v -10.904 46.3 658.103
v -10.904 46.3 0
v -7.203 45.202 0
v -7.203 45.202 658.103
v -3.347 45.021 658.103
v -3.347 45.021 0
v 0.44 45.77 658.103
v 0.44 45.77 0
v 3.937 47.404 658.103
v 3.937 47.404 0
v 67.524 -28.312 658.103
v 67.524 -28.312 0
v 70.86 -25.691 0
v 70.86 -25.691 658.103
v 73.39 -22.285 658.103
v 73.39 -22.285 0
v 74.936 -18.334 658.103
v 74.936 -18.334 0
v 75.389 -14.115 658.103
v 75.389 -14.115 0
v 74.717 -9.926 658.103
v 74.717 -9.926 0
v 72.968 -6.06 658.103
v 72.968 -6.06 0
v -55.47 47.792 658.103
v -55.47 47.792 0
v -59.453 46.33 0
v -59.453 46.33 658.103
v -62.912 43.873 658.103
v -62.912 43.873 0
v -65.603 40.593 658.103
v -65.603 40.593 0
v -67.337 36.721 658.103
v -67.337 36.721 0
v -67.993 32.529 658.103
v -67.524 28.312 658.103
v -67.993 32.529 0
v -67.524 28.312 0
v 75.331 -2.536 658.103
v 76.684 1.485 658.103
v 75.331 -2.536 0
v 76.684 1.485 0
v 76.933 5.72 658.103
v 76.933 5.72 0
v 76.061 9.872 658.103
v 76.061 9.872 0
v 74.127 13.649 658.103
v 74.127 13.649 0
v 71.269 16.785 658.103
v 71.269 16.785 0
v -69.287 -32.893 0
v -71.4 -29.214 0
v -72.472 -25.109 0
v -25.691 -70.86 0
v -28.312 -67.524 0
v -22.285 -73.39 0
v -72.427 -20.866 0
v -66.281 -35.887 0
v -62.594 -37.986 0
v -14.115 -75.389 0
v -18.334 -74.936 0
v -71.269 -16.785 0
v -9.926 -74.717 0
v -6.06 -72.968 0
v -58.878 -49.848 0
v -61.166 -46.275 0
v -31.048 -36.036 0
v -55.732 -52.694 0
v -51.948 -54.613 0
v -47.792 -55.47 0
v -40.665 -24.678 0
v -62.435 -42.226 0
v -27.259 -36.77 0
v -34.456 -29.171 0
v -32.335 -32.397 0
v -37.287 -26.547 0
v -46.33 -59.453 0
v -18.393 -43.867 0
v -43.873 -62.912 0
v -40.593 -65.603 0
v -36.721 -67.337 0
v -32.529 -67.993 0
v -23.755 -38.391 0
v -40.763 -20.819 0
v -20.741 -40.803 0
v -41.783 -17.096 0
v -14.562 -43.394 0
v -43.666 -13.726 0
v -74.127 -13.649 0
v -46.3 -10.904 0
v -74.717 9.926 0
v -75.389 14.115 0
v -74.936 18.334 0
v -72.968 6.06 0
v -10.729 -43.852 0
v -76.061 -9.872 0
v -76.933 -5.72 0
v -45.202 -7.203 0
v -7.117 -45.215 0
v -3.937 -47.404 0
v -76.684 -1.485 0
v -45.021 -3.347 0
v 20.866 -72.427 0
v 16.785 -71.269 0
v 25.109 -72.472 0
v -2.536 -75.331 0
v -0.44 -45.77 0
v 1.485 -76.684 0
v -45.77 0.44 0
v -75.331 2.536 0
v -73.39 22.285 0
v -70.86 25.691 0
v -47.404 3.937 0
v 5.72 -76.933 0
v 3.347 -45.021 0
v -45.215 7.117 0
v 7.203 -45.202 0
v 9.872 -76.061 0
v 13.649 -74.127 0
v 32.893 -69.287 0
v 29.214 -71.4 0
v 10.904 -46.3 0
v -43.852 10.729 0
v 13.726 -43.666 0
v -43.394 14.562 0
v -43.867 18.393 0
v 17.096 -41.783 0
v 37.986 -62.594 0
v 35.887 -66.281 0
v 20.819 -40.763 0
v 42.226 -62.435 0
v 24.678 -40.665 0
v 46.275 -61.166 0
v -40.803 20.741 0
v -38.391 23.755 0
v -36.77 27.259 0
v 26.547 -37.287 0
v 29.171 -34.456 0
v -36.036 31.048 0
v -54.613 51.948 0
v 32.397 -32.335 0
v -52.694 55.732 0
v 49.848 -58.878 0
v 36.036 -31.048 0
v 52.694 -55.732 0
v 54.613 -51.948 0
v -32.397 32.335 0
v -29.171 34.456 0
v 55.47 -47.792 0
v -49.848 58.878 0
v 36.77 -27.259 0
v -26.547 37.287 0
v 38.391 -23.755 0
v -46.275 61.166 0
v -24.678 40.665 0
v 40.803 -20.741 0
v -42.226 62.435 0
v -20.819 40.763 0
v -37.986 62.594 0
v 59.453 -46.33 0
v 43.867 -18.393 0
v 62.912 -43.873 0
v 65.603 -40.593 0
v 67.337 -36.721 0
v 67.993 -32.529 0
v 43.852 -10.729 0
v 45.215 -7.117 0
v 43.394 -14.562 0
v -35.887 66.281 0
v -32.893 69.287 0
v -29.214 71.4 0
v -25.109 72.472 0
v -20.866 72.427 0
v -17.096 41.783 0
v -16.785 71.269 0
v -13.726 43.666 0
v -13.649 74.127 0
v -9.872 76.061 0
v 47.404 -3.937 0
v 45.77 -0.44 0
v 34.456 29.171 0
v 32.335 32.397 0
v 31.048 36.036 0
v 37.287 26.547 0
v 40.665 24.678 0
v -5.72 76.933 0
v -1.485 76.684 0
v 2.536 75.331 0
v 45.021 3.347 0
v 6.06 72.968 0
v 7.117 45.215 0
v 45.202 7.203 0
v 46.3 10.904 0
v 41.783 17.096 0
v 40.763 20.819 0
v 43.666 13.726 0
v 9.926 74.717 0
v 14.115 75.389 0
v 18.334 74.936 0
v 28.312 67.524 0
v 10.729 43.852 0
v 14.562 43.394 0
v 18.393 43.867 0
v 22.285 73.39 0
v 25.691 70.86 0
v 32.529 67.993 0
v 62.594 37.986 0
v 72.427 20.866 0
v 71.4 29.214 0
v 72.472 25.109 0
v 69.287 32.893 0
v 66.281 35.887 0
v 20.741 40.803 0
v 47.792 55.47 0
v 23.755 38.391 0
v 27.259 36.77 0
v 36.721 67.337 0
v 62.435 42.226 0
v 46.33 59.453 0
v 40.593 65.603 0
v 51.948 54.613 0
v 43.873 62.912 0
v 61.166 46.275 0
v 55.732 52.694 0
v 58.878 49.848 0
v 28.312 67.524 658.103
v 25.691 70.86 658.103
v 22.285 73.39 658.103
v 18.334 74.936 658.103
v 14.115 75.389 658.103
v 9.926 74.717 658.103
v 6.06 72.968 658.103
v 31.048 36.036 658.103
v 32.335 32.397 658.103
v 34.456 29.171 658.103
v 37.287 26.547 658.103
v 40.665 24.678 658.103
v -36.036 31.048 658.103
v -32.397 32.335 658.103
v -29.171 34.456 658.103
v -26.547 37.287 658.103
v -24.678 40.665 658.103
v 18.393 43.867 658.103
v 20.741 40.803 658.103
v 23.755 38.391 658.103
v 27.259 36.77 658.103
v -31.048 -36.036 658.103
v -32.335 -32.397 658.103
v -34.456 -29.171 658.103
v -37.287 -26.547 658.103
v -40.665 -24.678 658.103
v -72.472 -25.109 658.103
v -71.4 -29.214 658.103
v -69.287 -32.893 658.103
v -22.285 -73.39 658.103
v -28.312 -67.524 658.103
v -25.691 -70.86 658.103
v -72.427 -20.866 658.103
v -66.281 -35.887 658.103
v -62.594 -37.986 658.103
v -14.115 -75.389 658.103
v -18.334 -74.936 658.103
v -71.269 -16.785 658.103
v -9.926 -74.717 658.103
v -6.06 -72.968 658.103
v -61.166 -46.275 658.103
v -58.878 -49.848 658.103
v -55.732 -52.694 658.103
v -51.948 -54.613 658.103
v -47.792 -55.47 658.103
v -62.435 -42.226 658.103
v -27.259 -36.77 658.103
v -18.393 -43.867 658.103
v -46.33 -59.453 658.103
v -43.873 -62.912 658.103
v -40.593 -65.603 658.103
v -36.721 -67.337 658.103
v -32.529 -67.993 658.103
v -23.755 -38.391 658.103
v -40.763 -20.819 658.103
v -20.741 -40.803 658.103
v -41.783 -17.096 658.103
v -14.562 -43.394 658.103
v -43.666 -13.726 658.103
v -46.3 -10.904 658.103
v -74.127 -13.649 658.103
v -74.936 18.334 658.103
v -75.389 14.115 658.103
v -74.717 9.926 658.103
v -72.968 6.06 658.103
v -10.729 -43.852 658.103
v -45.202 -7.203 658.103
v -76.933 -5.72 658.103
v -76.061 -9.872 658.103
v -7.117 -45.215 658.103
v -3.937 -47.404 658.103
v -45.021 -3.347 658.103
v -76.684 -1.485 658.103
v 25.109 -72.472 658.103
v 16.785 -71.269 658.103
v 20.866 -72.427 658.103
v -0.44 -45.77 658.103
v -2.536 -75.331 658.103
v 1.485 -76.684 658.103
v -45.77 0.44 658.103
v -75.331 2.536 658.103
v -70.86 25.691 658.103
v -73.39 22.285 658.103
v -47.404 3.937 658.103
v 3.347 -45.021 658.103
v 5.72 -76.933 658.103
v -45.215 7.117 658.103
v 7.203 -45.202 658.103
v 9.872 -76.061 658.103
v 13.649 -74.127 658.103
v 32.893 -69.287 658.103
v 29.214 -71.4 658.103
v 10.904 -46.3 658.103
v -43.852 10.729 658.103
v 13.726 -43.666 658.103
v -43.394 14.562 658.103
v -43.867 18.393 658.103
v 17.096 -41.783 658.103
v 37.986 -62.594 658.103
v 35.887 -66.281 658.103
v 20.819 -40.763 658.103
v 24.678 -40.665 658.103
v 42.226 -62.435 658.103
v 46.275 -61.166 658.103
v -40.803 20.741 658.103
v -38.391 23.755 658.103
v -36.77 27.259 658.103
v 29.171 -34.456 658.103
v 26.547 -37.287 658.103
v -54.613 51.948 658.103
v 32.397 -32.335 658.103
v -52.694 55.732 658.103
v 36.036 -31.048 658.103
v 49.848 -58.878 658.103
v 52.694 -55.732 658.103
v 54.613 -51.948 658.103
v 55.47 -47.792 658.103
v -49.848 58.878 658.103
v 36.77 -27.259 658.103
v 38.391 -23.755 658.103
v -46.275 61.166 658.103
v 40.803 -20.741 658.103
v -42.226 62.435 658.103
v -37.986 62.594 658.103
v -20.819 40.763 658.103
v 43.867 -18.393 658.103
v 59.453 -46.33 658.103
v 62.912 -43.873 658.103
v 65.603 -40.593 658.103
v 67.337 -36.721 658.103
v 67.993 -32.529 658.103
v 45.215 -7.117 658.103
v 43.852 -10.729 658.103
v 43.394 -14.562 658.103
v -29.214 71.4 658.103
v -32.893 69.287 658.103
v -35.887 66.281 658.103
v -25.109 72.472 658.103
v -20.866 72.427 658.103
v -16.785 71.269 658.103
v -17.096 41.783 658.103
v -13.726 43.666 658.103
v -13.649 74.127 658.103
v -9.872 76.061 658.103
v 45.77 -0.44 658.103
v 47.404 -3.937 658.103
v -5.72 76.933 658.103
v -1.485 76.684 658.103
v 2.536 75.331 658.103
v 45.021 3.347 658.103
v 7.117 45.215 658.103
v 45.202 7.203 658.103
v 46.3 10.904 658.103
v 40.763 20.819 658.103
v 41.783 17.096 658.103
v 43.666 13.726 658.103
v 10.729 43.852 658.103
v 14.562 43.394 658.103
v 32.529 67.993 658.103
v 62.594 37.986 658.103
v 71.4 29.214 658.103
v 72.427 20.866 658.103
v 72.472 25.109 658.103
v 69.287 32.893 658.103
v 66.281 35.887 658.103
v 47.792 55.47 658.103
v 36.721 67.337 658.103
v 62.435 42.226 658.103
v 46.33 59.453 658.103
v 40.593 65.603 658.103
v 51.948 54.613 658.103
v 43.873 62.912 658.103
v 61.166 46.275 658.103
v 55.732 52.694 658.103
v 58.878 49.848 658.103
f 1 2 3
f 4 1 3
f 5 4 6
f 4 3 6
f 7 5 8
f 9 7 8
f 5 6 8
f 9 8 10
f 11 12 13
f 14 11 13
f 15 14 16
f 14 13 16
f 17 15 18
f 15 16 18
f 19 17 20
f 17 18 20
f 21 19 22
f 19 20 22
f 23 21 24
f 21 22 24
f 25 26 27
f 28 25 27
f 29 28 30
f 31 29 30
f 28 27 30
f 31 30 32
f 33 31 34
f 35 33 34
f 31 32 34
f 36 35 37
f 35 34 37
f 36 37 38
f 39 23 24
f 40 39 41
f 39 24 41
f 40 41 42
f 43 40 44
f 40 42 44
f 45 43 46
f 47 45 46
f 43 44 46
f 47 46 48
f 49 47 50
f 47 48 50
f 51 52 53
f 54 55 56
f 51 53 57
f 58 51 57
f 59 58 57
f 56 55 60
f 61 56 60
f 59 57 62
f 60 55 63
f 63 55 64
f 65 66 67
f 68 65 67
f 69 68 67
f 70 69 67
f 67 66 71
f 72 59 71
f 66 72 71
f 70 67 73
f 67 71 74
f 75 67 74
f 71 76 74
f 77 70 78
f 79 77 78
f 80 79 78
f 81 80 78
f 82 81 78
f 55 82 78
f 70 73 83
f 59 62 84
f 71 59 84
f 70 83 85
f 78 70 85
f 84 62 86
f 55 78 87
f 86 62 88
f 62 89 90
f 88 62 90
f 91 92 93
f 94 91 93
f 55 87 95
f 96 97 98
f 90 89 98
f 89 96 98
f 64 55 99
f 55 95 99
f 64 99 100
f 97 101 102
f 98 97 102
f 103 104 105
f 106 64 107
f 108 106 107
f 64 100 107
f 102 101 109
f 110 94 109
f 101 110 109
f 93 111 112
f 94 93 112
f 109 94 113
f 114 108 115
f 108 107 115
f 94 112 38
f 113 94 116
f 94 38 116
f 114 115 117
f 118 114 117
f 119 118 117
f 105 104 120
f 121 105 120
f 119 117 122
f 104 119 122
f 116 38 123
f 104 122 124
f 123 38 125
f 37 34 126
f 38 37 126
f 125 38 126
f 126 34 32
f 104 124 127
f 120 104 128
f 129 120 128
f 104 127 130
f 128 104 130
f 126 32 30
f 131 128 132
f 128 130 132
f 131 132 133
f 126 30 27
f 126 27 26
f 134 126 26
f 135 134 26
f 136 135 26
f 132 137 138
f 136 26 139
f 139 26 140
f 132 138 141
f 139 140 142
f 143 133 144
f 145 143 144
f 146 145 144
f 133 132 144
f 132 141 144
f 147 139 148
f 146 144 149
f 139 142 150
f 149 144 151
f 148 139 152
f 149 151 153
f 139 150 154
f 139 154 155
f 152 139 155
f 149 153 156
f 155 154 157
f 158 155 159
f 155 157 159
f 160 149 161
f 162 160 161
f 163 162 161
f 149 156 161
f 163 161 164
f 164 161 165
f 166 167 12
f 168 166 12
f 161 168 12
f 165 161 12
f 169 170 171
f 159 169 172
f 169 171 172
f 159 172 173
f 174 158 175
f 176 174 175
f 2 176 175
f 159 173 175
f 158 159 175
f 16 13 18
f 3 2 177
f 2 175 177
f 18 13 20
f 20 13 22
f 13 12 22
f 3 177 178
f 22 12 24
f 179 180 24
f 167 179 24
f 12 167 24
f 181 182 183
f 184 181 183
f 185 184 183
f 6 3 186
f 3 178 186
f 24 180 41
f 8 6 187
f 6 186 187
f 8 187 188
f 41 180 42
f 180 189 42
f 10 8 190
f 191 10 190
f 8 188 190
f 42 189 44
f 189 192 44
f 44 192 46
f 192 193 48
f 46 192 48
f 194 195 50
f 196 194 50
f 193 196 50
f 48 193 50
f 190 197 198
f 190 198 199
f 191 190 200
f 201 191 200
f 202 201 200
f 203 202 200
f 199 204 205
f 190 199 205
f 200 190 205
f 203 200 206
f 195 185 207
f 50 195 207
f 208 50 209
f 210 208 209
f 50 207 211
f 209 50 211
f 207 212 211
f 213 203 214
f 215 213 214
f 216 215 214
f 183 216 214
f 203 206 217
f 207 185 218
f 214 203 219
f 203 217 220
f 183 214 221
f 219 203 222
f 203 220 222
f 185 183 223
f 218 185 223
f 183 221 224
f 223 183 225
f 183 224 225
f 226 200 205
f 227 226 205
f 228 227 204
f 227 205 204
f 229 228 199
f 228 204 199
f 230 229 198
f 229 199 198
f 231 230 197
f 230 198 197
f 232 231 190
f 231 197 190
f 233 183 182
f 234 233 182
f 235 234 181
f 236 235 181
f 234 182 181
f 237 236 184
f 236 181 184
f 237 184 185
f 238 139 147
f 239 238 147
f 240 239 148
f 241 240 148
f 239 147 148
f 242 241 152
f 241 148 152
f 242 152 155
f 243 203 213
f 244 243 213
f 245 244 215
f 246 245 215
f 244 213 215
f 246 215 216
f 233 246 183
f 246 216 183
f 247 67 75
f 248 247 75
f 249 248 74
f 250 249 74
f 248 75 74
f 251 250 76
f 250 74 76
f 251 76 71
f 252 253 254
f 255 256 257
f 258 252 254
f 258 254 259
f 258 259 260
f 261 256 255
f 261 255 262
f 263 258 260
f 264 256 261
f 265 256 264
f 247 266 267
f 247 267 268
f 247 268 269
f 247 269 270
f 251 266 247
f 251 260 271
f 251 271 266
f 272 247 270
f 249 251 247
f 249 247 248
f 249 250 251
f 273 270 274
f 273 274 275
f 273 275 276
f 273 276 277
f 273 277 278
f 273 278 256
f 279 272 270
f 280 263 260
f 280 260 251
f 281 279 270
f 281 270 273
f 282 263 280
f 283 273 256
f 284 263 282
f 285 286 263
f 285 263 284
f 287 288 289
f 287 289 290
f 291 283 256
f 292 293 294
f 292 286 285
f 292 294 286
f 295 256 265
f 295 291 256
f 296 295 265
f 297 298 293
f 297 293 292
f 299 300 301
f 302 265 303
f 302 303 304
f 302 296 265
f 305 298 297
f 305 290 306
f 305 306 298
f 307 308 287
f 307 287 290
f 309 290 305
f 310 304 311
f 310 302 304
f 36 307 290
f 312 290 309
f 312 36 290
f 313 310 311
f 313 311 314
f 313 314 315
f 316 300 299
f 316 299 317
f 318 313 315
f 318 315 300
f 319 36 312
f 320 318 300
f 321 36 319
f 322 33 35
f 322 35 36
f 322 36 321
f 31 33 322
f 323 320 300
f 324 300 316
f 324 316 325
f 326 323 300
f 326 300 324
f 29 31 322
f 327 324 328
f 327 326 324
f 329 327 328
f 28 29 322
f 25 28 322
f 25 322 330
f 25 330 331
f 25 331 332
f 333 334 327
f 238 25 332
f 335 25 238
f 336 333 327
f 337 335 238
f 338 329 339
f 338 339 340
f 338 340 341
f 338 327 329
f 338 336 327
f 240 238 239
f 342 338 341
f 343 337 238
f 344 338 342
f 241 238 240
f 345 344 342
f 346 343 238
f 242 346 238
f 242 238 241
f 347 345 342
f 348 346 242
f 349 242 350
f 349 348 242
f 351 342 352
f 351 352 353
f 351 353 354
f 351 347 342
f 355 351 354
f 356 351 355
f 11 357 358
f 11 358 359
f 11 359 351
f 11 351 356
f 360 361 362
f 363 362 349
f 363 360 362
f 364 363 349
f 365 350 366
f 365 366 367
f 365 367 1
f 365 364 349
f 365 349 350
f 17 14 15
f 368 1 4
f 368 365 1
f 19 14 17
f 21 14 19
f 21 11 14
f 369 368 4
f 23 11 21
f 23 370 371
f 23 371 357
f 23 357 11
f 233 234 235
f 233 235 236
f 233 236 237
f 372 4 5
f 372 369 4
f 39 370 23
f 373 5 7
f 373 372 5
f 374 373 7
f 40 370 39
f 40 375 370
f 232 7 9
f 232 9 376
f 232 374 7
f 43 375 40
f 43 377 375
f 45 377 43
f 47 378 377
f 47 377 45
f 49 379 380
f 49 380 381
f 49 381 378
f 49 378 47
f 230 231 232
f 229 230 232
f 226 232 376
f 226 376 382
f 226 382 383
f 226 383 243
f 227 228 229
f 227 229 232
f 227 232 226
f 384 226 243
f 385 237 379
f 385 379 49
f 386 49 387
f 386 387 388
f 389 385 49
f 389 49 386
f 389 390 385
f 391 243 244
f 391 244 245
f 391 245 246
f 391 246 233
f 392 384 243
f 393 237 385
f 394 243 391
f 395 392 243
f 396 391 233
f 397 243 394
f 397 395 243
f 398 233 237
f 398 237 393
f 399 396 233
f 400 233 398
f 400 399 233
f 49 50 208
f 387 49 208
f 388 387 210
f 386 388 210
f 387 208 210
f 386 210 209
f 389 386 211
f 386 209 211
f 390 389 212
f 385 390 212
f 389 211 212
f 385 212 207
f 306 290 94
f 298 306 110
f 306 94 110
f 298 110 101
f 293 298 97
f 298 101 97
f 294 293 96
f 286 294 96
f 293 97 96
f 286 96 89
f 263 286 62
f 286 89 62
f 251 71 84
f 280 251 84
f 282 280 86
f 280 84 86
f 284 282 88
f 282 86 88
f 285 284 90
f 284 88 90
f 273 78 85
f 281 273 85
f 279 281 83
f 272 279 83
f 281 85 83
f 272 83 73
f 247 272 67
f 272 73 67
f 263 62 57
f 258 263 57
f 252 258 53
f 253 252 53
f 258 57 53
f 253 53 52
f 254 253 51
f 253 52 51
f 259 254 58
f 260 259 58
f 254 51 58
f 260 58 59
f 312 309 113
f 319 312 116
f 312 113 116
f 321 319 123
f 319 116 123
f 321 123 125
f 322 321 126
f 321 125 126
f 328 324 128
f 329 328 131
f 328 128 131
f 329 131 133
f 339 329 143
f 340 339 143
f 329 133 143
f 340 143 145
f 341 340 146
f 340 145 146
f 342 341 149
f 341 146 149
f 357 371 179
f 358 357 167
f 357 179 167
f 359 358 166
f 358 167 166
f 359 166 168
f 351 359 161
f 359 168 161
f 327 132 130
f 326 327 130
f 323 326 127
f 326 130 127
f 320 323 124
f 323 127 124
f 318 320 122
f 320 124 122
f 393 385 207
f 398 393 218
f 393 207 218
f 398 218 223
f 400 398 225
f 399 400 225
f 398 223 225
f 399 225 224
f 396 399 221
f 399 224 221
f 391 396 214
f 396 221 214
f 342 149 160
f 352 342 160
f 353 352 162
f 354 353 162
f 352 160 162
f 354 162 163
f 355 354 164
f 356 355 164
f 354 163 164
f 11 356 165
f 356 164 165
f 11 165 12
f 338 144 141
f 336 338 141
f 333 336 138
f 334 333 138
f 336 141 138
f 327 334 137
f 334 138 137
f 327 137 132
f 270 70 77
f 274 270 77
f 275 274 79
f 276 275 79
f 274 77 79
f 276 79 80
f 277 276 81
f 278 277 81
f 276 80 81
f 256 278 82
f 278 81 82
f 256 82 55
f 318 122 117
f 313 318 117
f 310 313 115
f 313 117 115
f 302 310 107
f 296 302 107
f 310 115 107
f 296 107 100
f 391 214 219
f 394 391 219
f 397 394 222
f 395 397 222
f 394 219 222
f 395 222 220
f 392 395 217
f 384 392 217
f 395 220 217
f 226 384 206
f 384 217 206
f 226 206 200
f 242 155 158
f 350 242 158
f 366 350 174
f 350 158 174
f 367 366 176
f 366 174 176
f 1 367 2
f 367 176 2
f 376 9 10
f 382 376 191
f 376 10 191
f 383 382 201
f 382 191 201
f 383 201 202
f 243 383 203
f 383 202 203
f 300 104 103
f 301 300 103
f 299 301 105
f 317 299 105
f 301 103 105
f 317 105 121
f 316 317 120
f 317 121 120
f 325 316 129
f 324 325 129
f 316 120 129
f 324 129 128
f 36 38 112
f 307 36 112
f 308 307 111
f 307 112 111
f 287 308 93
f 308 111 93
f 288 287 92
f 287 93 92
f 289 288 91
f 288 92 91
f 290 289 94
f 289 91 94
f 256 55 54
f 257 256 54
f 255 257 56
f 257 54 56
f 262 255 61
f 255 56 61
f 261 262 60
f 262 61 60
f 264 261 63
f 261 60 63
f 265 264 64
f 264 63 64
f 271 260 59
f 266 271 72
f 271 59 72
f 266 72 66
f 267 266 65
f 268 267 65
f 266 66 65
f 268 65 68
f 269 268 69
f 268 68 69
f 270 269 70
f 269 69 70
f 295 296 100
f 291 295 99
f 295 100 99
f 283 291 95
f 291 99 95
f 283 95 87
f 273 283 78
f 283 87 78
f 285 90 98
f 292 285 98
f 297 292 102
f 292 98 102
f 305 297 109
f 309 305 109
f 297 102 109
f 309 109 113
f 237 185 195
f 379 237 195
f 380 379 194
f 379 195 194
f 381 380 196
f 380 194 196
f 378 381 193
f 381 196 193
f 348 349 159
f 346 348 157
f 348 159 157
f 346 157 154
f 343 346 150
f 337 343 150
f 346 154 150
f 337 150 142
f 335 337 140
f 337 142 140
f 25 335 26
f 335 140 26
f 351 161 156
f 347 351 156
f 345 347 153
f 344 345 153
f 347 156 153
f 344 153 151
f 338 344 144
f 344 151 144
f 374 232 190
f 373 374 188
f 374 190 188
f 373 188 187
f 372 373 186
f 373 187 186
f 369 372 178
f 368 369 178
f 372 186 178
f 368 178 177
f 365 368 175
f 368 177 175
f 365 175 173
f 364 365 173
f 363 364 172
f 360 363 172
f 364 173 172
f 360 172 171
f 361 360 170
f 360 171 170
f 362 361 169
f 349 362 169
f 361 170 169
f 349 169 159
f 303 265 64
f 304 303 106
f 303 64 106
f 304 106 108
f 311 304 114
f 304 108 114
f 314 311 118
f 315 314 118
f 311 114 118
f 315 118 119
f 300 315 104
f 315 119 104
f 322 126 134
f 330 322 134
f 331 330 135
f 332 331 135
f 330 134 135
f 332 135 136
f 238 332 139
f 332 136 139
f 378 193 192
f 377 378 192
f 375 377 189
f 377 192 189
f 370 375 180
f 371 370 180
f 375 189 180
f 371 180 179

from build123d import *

# Parameters (mm, degrees)
EXTRUDE_1_DEPTH = 658.10320896


with BuildPart() as part:
    # 草图1 → 凸台-拉伸1 (new body)
    with BuildSketch(Plane.XY):
        with BuildLine():
            ThreePointArc((-16.784563495, 71.269141327), (-29.213900725, 71.400407716), (-37.986444329, 62.594265907))
            ThreePointArc((-37.986444329, 62.594265907), (-49.84801004, 58.878231228), (-55.469947326, 47.79222762))
            ThreePointArc((-55.469947326, 47.79222762), (-65.602648822, 40.592643239), (-67.523665397, 28.311953105))
            ThreePointArc((-67.523665397, 28.311953105), (-74.935643256, 18.333564505), (-72.967696633, 6.06030736))
            ThreePointArc((-72.967696633, 6.06030736), (-76.93341482, -5.720131261), (-71.269141327, -16.784563495))
            ThreePointArc((-71.269141327, -16.784563495), (-71.400407716, -29.213900725), (-62.594265907, -37.986444329))
            ThreePointArc((-62.594265907, -37.986444329), (-58.878231228, -49.84801004), (-47.79222762, -55.469947326))
            ThreePointArc((-47.79222762, -55.469947326), (-40.592643239, -65.602648822), (-28.311953105, -67.523665397))
            ThreePointArc((-28.311953105, -67.523665397), (-18.333564505, -74.935643256), (-6.06030736, -72.967696633))
            ThreePointArc((-6.06030736, -72.967696633), (5.720131261, -76.93341482), (16.784563495, -71.269141327))
            ThreePointArc((16.784563495, -71.269141327), (29.213900725, -71.400407716), (37.986444329, -62.594265907))
            ThreePointArc((37.986444329, -62.594265907), (49.84801004, -58.878231228), (55.469947326, -47.79222762))
            ThreePointArc((55.469947326, -47.79222762), (65.602648822, -40.592643239), (67.523665397, -28.311953105))
            ThreePointArc((67.523665397, -28.311953105), (74.935643256, -18.333564505), (72.967696633, -6.06030736))
            ThreePointArc((72.967696633, -6.06030736), (76.93341482, 5.720131261), (71.269141327, 16.784563495))
            ThreePointArc((71.269141327, 16.784563495), (71.400407716, 29.213900725), (62.594265907, 37.986444329))
            ThreePointArc((62.594265907, 37.986444329), (58.878231228, 49.84801004), (47.79222762, 55.469947326))
            ThreePointArc((47.79222762, 55.469947326), (40.592643239, 65.602648822), (28.311953105, 67.523665397))
            ThreePointArc((28.311953105, 67.523665397), (18.333564505, 74.935643256), (6.06030736, 72.967696633))
            ThreePointArc((6.06030736, 72.967696633), (-5.720131261, 76.93341482), (-16.784563495, 71.269141327))
        make_face()
        with BuildLine():
            ThreePointArc((-10.90414258, 46.300213814), (-3.3474183, 45.021400536), (3.937097057, 47.40368542))
            ThreePointArc((3.937097057, 47.40368542), (10.728793889, 43.852305495), (18.392946202, 43.866954016))
            ThreePointArc((18.392946202, 43.866954016), (23.754796981, 38.390641254), (31.048365622, 36.036219514))
            ThreePointArc((31.048365622, 36.036219514), (34.455515034, 29.171033565), (40.664554688, 24.678008767))
            ThreePointArc((40.664554688, 24.678008767), (41.783487211, 17.095961863), (46.300213814, 10.90414258))
            ThreePointArc((46.300213814, 10.90414258), (45.021400536, 3.3474183), (47.40368542, -3.937097057))
            ThreePointArc((47.40368542, -3.937097057), (43.852305495, -10.728793889), (43.866954016, -18.392946202))
            ThreePointArc((43.866954016, -18.392946202), (38.390641254, -23.754796981), (36.036219514, -31.048365622))
            ThreePointArc((36.036219514, -31.048365622), (29.171033565, -34.455515034), (24.678008767, -40.664554688))
            ThreePointArc((24.678008767, -40.664554688), (17.095961863, -41.783487211), (10.90414258, -46.300213814))
            ThreePointArc((10.90414258, -46.300213814), (3.3474183, -45.021400536), (-3.937097057, -47.40368542))
            ThreePointArc((-3.937097057, -47.40368542), (-10.728793889, -43.852305495), (-18.392946202, -43.866954016))
            ThreePointArc((-18.392946202, -43.866954016), (-23.754796981, -38.390641254), (-31.048365622, -36.036219514))
            ThreePointArc((-31.048365622, -36.036219514), (-34.455515034, -29.171033565), (-40.664554688, -24.678008767))
            ThreePointArc((-40.664554688, -24.678008767), (-41.783487211, -17.095961863), (-46.300213814, -10.90414258))
            ThreePointArc((-46.300213814, -10.90414258), (-45.021400536, -3.3474183), (-47.40368542, 3.937097057))
            ThreePointArc((-47.40368542, 3.937097057), (-43.852305495, 10.728793889), (-43.866954016, 18.392946202))
            ThreePointArc((-43.866954016, 18.392946202), (-38.390641254, 23.754796981), (-36.036219514, 31.048365622))
            ThreePointArc((-36.036219514, 31.048365622), (-29.171033565, 34.455515034), (-24.678008767, 40.664554688))
            ThreePointArc((-24.678008767, 40.664554688), (-17.095961863, 41.783487211), (-10.90414258, 46.300213814))
        make_face(mode=Mode.SUBTRACT)
    extrude(amount=EXTRUDE_1_DEPTH)


solid = part.part
